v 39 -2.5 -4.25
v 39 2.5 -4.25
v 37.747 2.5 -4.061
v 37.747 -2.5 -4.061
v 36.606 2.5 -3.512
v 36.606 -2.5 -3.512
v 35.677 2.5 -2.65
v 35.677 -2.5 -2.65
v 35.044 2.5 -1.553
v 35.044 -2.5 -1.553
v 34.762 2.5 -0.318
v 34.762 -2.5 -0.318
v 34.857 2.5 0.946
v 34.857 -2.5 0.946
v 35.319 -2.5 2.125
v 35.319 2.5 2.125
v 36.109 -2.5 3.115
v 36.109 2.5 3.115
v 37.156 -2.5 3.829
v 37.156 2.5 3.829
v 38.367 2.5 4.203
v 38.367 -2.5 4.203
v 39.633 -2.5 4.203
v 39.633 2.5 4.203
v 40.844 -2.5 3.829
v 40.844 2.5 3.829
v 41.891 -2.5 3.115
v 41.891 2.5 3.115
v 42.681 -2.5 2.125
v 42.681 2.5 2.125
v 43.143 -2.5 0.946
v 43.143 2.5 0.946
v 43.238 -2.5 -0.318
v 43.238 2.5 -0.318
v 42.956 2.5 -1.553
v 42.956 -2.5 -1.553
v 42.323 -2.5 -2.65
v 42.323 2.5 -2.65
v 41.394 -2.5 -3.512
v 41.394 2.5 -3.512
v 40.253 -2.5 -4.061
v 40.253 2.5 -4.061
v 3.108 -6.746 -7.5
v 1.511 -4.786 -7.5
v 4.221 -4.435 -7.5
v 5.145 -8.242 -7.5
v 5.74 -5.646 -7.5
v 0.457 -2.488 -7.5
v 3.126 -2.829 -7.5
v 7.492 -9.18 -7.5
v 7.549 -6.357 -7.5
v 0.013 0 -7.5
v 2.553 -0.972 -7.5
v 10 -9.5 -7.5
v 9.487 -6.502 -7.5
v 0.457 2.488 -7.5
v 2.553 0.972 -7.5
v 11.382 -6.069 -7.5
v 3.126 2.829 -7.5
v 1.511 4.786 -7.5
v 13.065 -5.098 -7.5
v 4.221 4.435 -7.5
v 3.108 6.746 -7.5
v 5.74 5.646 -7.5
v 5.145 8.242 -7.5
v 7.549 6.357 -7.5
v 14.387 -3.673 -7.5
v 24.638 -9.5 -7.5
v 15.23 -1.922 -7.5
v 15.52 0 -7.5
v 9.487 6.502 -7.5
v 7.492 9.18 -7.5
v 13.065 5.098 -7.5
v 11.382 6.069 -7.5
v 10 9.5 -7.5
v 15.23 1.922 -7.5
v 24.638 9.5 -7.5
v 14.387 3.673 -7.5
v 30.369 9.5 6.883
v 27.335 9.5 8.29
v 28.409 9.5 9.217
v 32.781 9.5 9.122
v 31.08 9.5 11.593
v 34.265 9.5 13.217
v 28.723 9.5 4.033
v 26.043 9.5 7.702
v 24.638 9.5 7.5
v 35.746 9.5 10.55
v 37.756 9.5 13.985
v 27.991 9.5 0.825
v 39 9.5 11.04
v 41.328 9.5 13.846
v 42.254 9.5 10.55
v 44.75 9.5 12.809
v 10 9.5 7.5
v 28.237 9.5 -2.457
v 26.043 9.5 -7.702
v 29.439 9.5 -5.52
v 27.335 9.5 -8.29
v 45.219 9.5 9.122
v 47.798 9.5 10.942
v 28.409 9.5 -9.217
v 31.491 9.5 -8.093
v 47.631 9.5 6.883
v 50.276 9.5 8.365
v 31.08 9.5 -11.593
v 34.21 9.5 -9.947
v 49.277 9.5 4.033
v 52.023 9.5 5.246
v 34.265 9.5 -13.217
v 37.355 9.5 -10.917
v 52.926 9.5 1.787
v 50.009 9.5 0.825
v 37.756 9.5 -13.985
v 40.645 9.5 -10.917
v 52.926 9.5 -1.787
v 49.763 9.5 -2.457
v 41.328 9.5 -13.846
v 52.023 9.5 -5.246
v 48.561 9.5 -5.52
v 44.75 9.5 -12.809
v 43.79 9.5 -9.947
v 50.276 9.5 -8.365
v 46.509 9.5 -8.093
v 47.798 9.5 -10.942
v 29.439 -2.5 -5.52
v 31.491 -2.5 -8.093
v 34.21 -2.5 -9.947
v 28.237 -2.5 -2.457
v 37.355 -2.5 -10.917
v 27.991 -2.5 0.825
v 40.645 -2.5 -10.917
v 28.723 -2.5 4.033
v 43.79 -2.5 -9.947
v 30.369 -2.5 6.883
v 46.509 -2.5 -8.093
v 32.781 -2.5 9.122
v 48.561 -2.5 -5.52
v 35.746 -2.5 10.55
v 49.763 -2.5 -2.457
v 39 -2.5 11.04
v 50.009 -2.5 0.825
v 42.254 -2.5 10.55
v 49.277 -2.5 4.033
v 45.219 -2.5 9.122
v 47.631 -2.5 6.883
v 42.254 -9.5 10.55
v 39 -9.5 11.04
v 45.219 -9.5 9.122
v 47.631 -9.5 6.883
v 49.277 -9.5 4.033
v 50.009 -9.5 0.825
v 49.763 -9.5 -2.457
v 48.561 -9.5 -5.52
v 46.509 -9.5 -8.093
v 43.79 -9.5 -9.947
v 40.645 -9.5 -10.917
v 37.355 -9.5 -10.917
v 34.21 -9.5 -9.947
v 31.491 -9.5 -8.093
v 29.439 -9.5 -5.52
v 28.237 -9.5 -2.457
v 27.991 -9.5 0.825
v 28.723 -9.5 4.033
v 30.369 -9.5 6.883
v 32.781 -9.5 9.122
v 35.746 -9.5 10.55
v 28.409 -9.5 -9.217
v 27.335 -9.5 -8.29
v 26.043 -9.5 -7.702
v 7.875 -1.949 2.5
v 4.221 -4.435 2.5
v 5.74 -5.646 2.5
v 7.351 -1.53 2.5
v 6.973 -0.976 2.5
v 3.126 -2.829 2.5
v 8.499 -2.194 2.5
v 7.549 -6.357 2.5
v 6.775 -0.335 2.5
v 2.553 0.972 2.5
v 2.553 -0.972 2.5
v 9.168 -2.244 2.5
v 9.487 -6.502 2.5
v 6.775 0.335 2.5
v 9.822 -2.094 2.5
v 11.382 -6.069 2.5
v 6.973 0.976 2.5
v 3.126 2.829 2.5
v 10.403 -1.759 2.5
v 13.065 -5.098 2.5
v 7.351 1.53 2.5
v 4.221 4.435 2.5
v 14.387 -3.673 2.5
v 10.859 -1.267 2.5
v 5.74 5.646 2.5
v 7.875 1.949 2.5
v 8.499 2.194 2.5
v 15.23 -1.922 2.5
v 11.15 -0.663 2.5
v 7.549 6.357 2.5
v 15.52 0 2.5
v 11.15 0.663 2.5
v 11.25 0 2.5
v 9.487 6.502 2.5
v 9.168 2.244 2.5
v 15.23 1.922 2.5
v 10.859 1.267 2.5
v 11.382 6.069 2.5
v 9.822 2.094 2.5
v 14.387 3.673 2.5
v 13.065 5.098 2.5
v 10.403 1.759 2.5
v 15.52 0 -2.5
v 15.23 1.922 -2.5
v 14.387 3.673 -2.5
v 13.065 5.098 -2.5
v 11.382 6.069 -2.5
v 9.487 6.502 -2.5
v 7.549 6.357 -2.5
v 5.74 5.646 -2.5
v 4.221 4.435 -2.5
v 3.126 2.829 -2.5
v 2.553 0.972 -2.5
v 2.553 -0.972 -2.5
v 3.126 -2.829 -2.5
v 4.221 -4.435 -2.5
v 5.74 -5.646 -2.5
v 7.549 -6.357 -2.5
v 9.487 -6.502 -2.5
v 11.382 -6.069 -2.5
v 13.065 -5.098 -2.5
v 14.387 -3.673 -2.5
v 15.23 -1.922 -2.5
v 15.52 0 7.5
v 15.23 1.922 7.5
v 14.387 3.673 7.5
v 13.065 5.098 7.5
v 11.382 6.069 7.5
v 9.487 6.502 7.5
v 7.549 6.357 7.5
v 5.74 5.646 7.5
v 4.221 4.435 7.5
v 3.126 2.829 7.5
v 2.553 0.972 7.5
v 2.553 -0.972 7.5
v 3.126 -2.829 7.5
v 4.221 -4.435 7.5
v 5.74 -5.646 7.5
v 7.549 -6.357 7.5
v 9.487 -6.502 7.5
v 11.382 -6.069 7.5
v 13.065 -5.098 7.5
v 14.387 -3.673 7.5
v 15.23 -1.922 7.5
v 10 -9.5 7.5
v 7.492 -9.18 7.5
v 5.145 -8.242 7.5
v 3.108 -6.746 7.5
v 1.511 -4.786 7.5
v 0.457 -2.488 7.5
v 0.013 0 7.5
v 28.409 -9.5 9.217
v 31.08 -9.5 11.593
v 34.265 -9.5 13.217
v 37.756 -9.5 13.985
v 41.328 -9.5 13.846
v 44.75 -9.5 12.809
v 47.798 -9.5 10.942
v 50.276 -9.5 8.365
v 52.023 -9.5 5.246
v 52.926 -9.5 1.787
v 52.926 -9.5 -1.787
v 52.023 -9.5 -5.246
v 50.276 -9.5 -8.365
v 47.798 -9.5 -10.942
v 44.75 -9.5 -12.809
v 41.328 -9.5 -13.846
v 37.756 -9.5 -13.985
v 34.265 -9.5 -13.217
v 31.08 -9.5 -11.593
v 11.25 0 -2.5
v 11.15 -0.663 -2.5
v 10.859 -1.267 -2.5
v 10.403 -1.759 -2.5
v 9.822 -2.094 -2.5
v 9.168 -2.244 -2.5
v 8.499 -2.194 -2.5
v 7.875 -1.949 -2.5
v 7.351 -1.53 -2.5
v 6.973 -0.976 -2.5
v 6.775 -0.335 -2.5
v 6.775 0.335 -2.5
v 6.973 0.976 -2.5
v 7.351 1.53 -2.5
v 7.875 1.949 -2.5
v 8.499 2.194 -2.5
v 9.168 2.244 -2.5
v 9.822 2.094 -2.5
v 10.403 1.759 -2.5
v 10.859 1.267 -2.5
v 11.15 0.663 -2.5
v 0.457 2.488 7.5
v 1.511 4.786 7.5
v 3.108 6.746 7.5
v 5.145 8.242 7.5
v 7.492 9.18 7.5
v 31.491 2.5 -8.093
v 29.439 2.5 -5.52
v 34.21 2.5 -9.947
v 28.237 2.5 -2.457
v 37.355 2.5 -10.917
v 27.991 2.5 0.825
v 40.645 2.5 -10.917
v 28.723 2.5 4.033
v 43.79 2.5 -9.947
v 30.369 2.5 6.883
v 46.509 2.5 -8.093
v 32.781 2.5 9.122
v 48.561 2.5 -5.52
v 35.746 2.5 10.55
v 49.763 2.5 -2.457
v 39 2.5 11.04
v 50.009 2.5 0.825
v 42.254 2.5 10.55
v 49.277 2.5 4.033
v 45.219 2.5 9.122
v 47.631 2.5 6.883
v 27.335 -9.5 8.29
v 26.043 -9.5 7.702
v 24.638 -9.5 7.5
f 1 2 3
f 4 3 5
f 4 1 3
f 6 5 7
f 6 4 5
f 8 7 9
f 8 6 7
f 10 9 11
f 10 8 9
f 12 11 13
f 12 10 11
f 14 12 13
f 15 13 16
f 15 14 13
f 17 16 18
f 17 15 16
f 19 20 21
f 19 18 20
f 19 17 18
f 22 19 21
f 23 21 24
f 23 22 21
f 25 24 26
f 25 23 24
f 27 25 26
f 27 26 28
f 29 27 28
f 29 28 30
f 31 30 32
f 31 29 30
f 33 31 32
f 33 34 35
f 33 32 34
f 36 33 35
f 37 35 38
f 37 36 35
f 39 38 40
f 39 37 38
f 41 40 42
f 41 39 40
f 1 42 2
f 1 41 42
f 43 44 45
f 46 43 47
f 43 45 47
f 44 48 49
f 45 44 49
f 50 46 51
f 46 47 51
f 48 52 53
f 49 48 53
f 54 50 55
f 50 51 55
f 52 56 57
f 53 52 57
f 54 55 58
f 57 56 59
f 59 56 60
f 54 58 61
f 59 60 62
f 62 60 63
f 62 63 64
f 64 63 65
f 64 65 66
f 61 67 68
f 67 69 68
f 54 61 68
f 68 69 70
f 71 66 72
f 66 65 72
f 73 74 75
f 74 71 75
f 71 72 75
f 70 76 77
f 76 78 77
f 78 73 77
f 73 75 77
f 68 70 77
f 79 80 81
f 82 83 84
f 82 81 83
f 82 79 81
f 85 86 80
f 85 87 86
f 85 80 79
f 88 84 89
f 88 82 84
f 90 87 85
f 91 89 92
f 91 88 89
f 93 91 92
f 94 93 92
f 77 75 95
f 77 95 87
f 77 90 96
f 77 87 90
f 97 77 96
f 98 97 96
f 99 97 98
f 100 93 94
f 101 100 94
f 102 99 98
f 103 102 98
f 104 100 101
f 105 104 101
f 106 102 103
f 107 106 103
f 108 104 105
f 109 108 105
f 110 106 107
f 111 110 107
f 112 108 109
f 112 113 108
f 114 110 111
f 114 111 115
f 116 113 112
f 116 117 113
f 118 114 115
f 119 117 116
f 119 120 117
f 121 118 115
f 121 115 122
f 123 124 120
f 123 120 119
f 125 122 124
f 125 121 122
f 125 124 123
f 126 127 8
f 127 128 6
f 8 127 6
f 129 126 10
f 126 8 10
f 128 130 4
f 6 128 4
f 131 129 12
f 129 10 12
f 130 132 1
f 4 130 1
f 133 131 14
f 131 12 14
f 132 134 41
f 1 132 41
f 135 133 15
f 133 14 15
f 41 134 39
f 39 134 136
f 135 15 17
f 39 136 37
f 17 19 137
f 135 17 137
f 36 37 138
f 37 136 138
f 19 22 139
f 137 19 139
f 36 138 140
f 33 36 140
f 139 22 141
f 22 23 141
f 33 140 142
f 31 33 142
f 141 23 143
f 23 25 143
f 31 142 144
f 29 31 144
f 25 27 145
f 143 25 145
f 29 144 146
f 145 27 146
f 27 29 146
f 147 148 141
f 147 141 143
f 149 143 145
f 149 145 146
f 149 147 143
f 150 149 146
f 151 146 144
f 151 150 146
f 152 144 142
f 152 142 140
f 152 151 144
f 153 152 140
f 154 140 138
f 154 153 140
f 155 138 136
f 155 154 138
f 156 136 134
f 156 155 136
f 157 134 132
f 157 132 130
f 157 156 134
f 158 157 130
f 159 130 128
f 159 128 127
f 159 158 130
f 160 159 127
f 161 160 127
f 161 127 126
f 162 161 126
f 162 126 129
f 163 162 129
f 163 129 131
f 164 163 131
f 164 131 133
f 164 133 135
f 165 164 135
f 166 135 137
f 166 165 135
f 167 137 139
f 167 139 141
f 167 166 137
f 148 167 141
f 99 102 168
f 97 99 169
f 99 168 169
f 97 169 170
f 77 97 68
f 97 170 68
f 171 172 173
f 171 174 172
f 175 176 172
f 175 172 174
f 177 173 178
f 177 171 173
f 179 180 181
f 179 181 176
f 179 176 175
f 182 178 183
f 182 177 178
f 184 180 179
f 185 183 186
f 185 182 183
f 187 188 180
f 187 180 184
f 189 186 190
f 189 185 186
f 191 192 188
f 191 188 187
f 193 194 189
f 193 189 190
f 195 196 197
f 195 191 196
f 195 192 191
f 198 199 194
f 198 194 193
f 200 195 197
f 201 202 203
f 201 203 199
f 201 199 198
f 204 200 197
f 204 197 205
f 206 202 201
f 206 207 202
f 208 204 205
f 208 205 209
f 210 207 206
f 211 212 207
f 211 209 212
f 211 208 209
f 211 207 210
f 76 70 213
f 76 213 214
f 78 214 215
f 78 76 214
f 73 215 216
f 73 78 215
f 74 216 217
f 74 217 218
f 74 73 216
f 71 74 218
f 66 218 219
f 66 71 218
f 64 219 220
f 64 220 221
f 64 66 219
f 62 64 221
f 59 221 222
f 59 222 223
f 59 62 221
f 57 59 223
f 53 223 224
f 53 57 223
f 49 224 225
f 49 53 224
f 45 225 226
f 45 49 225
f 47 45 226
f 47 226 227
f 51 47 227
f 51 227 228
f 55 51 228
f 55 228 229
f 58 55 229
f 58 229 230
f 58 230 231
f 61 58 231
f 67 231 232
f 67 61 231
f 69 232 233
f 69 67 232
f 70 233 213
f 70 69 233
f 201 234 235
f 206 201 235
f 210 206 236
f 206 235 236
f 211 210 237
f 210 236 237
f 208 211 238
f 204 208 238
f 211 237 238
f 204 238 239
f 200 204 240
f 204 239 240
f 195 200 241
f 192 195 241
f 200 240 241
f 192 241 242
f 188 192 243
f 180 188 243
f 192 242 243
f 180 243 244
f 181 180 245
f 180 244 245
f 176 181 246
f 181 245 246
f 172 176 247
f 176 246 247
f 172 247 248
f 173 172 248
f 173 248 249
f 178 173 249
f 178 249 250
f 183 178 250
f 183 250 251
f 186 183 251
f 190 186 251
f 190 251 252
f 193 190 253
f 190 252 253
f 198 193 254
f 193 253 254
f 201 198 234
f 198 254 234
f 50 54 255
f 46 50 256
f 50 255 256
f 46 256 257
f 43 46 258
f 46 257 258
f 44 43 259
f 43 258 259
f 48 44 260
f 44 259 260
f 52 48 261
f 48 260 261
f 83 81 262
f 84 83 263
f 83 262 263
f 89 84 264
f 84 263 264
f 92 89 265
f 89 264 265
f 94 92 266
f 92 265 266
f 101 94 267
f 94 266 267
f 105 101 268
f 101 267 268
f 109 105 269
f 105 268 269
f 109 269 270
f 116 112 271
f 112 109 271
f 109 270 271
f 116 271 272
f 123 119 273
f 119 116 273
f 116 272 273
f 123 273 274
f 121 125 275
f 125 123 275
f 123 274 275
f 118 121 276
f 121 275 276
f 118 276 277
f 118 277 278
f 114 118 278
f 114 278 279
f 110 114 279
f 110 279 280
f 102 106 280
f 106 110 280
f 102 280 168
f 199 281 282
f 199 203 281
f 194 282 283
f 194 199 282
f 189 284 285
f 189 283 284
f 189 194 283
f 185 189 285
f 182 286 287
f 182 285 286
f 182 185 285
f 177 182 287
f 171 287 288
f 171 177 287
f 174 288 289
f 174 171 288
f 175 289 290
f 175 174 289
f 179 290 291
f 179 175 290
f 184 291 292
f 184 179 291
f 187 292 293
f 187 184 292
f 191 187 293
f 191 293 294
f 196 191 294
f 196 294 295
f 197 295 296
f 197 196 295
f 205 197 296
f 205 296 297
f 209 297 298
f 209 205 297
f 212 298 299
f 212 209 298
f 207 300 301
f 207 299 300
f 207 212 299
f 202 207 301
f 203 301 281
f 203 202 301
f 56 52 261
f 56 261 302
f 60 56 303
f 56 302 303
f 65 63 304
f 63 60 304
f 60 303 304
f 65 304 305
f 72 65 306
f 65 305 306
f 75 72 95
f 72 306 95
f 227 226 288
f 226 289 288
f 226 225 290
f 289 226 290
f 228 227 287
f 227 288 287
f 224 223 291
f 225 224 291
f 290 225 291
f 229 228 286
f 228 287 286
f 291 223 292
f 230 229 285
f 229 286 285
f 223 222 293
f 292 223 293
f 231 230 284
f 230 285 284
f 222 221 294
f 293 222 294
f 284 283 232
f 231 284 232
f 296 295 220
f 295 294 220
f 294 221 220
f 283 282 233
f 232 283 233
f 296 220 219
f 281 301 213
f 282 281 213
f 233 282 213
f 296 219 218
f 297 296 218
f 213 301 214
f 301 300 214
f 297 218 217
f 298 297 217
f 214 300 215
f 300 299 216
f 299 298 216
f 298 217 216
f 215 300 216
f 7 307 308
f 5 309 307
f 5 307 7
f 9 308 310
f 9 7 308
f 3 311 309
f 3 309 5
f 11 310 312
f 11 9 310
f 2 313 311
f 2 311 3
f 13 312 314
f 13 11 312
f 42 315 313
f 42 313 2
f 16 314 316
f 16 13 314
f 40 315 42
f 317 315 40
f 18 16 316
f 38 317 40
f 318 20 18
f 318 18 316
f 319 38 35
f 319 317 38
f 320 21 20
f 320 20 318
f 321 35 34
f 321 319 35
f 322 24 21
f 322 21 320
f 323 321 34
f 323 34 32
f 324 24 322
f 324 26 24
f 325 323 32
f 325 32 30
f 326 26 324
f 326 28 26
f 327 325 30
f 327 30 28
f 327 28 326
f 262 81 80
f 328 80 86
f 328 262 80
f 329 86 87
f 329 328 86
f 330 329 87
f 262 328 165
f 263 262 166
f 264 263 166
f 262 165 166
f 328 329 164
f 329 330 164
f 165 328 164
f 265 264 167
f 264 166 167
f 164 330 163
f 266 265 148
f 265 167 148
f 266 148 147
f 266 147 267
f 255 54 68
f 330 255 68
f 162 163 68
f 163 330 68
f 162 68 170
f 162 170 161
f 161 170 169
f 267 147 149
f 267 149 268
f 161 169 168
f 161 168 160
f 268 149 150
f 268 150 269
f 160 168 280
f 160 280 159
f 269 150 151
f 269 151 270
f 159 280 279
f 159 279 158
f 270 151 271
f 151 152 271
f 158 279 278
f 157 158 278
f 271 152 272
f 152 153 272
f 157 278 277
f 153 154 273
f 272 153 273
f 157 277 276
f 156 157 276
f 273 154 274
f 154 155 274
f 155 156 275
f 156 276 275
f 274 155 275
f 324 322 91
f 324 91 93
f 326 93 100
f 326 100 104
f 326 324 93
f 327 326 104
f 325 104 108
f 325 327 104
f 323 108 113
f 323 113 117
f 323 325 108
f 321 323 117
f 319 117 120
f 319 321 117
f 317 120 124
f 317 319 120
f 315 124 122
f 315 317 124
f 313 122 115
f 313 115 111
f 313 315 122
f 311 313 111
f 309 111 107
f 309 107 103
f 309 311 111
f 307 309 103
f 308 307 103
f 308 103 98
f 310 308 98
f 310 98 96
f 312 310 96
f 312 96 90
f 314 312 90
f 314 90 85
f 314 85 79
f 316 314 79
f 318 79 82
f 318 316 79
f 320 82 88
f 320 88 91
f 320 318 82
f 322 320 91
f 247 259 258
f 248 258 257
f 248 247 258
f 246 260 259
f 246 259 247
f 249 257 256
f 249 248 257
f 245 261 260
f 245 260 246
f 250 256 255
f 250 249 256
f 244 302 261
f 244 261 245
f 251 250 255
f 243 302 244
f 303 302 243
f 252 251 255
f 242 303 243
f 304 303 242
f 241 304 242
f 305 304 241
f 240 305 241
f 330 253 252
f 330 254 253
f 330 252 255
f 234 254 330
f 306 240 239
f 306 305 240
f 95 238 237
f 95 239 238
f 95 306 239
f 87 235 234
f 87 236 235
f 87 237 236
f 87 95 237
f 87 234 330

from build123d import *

# Parameters (mm, degrees)
BOSS_EXTRUDE1_DEPTH        = 7.5
CORTAR_EXTRUIR1_START      = 7.5
SKETCH1_3_R                = 6.52
CORTAR_EXTRUIR1_DEPTH      = 5
CORTAR_EXTRUIR2_START      = -7.5
SKETCH1_5_R                = 6.52
CORTAR_EXTRUIR2_DEPTH      = 5
BOSS_EXTRUDE3_DEPTH        = 9.5
BOSS_EXTRUDE3_DEPTH_BACK   = 9.5
SKETCH2_R                  = 14.04
SKETCH2_R_2                = 4.25
CORTAR_EXTRUIR3_START      = -9.5
SKETCH2_4_R                = 11.04
CORTAR_EXTRUIR3_DEPTH      = 7
CORTAR_EXTRUIR4_START      = 2.5
SKETCH2_5_R                = 11.04
CORTAR_EXTRUIR4_DEPTH      = 7
CORTAR_EXTRUIR5_DEPTH      = 56.683150055
CORTAR_EXTRUIR5_DEPTH_BACK = 56.683150055
SKETCH2_6_R                = 4.25
FILLET1_R                  = 5
FILLET2_R                  = 10


with BuildPart() as part:
    # Sketch1 → Boss-Extrude1 (new, symmetric)
    with BuildSketch(Plane.XY):
        with BuildLine():
            ThreePointArc((6.75, 0), (9, 2.25), (11.25, 0))
            Line((11.25, 0), (15.52, 0))
            ThreePointArc((15.52, 0), (9, 6.52), (2.48, 0))
            Line((2.48, 0), (6.75, 0))
        make_face()
        with BuildLine():
            Line((15.52, 0), (11.25, 0))
            ThreePointArc((11.25, 0), (9, -2.25), (6.75, 0))
            Line((6.75, 0), (2.48, 0))
            ThreePointArc((2.48, 0), (9, -6.52), (15.52, 0))
        make_face()
        with BuildLine():
            ThreePointArc((2.48, 0), (9, 6.52), (15.52, 0))
            Line((15.52, 0), (39, 0))
            Line((39, 0), (39, 9.5))
            Line((39, 9.5), (0, 9.5))
            Line((0, 9.5), (0, 0))
            Line((0, 0), (2.48, 0))
        make_face()
        with BuildLine():
            Line((39, 0), (15.52, 0))
            ThreePointArc((15.52, 0), (9, -6.52), (2.48, 0))
            Line((2.48, 0), (0, 0))
            Line((0, 0), (0, -9.5))
            Line((0, -9.5), (39, -9.5))
            Line((39, -9.5), (39, 0))
        make_face()
    extrude(amount=BOSS_EXTRUDE1_DEPTH, both=True)

    # Sketch1<3> → Cortar-Extruir1 (cut)
    with BuildSketch(Plane.XY.offset(CORTAR_EXTRUIR1_START)):
        with Locations((9, 0)):
            Circle(SKETCH1_3_R)
    extrude(amount=-CORTAR_EXTRUIR1_DEPTH, mode=Mode.SUBTRACT)

    # Sketch1<5> → Cortar-Extruir2 (cut)
    with BuildSketch(Plane.XY.offset(CORTAR_EXTRUIR2_START)):
        with Locations((9, 0)):
            Circle(SKETCH1_5_R)
    extrude(amount=CORTAR_EXTRUIR2_DEPTH, mode=Mode.SUBTRACT)

    # Sketch2 → Boss-Extrude3 (add, two sides: drawn at the far end of the back side and taken through both)
    with BuildSketch(Plane(origin=(0, 0, 0), x_dir=(1, 0, 0), z_dir=(0, 1, 0)).offset(-BOSS_EXTRUDE3_DEPTH_BACK)):
        with Locations((39, 0)):
            Circle(SKETCH2_R)
        with Locations((39, 0)):
            Circle(SKETCH2_R_2, mode=Mode.SUBTRACT)
    extrude(amount=BOSS_EXTRUDE3_DEPTH + BOSS_EXTRUDE3_DEPTH_BACK)

    # Sketch2<4> → Cortar-Extruir3 (cut)
    with BuildSketch(Plane(origin=(0, 0, 0), x_dir=(1, 0, 0), z_dir=(0, 1, 0)).offset(CORTAR_EXTRUIR3_START)):
        with Locations(Location((39, 0, 0), (0, 0, 270))):
            Circle(SKETCH2_4_R)
    extrude(amount=CORTAR_EXTRUIR3_DEPTH, mode=Mode.SUBTRACT)

    # Sketch2<5> → Cortar-Extruir4 (cut)
    with BuildSketch(Plane(origin=(0, 0, 0), x_dir=(1, 0, 0), z_dir=(0, 1, 0)).offset(CORTAR_EXTRUIR4_START)):
        with Locations(Location((39, 0, 0), (0, 0, 270))):
            Circle(SKETCH2_5_R)
    extrude(amount=CORTAR_EXTRUIR4_DEPTH, mode=Mode.SUBTRACT)

    # Sketch2<6> → Cortar-Extruir5 (cut, two sides: drawn at the far end of the back side and taken through both)
    with BuildSketch(Plane(origin=(0, 0, 0), x_dir=(1, 0, 0), z_dir=(0, 1, 0)).offset(-CORTAR_EXTRUIR5_DEPTH_BACK)):
        with Locations(Location((39, 0, 0), (0, 0, 270))):
            Circle(SKETCH2_6_R)
    extrude(amount=CORTAR_EXTRUIR5_DEPTH + CORTAR_EXTRUIR5_DEPTH_BACK, mode=Mode.SUBTRACT)

    # Fillet1
    fillet1_edges = [part.edges().sort_by_distance(p)[0] for p in [
        (27.13106576, 0, -7.5),
        (27.13106576, 0, 7.5),
    ]]
    fillet(fillet1_edges, radius=FILLET1_R)

    # Fillet2
    # the kernel refuses this fillet: 10 mm, written as the material it takes off along each edge
    with BuildSketch(Plane(origin=(0, -9.5, 32.5), x_dir=(1, 0, 0), z_dir=(0, 0, -1)), Plane(origin=(0, 9.5, 32.5), x_dir=(0, -1, 0), z_dir=(0, 0, -1))) as fillet2_piece_1:
        with BuildLine():
            CenterArc((FILLET2_R, -FILLET2_R), FILLET2_R, 90, 90)
            Line((0, -FILLET2_R), (0, 0))
            Line((0, 0), (FILLET2_R, 0))
        make_face()
    extrude(amount=65, mode=Mode.SUBTRACT)


solid = part.part
